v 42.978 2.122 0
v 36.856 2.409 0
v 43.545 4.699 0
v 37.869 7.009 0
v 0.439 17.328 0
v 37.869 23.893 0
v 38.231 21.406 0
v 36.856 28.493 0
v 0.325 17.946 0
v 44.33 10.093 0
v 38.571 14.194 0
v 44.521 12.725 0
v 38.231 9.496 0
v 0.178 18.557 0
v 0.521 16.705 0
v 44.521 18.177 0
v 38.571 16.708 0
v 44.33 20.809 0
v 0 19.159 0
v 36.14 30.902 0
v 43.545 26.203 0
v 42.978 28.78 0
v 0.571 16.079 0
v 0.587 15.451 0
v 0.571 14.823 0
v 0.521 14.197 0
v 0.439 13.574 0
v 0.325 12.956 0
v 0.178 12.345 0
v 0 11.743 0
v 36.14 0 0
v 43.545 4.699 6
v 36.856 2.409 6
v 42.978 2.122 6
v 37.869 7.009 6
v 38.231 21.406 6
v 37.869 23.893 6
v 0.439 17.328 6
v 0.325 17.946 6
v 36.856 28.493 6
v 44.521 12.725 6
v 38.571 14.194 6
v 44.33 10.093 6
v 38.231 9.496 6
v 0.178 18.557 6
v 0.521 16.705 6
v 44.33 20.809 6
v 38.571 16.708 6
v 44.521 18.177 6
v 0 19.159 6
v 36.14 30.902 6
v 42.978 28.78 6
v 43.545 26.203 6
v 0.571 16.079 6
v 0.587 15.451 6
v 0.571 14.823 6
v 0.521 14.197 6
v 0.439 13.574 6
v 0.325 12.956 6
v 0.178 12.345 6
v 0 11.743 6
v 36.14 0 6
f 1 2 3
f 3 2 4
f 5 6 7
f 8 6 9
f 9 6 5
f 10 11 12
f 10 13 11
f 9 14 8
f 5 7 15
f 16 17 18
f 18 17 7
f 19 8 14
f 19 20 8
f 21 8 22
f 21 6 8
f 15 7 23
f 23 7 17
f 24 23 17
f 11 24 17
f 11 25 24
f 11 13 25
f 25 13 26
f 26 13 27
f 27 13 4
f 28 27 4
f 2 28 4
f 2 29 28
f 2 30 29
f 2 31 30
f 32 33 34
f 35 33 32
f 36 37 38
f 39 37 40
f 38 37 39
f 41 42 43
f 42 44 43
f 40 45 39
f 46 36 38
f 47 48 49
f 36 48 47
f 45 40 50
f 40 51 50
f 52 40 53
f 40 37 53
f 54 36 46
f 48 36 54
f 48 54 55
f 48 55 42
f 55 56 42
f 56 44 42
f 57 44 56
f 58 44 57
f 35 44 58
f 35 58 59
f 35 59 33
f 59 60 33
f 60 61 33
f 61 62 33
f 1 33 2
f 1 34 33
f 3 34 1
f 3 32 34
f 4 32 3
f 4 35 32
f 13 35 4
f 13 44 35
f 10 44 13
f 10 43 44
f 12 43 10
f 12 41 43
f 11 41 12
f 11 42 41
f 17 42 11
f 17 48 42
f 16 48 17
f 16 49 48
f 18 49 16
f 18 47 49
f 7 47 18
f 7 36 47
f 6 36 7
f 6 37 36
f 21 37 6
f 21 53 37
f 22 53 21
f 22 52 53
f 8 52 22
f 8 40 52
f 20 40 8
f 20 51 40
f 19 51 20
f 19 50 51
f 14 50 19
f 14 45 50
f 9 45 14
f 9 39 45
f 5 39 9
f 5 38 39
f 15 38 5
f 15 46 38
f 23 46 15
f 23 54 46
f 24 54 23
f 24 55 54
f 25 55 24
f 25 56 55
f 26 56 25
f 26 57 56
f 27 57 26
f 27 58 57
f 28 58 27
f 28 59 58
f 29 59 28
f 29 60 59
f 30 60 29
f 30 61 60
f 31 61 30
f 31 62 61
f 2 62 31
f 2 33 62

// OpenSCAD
$fn = 32;

// ----------------------------------------------------------------------
// Gear sector: 4 teeth on 36 degrees
// ----------------------------------------------------------------------

// --- parameters (mm) ---
sector_angle = 36;        // sector angle, degrees
root_r = 50;              // root circle radius
tooth_h = 6;              // tooth height over the root circle
teeth = 4;                // number of teeth on the sector
hub_r = 12;               // hub bore radius
plate_t = 6;              // sector thickness, Z
arc_step = 3;             // sampling step of the root/hub arcs, degrees

tip_r = root_r + tooth_h;  // tip circle radius

profile = [[36.14, 0], [36.856, 2.409], [42.978, 2.122], [43.545, 4.699], [37.869, 7.009], [38.231, 9.496], [44.33, 10.093], [44.521, 12.725], [38.571, 14.194], [38.571, 16.708], [44.521, 18.177], [44.33, 20.809], [38.231, 21.406], [37.869, 23.893], [43.545, 26.203], [42.978, 28.78], [36.856, 28.493], [36.14, 30.902], [0, 19.159], [0.178, 18.557], [0.325, 17.946], [0.439, 17.328], [0.521, 16.705], [0.571, 16.079], [0.587, 15.451], [0.571, 14.823], [0.521, 14.197], [0.439, 13.574], [0.325, 12.956], [0.178, 12.345], [0, 11.743]];  // primary outline, 31 points, counter clockwise

// --- the one profile operation ---
linear_extrude(height = plate_t) polygon(points = profile);
